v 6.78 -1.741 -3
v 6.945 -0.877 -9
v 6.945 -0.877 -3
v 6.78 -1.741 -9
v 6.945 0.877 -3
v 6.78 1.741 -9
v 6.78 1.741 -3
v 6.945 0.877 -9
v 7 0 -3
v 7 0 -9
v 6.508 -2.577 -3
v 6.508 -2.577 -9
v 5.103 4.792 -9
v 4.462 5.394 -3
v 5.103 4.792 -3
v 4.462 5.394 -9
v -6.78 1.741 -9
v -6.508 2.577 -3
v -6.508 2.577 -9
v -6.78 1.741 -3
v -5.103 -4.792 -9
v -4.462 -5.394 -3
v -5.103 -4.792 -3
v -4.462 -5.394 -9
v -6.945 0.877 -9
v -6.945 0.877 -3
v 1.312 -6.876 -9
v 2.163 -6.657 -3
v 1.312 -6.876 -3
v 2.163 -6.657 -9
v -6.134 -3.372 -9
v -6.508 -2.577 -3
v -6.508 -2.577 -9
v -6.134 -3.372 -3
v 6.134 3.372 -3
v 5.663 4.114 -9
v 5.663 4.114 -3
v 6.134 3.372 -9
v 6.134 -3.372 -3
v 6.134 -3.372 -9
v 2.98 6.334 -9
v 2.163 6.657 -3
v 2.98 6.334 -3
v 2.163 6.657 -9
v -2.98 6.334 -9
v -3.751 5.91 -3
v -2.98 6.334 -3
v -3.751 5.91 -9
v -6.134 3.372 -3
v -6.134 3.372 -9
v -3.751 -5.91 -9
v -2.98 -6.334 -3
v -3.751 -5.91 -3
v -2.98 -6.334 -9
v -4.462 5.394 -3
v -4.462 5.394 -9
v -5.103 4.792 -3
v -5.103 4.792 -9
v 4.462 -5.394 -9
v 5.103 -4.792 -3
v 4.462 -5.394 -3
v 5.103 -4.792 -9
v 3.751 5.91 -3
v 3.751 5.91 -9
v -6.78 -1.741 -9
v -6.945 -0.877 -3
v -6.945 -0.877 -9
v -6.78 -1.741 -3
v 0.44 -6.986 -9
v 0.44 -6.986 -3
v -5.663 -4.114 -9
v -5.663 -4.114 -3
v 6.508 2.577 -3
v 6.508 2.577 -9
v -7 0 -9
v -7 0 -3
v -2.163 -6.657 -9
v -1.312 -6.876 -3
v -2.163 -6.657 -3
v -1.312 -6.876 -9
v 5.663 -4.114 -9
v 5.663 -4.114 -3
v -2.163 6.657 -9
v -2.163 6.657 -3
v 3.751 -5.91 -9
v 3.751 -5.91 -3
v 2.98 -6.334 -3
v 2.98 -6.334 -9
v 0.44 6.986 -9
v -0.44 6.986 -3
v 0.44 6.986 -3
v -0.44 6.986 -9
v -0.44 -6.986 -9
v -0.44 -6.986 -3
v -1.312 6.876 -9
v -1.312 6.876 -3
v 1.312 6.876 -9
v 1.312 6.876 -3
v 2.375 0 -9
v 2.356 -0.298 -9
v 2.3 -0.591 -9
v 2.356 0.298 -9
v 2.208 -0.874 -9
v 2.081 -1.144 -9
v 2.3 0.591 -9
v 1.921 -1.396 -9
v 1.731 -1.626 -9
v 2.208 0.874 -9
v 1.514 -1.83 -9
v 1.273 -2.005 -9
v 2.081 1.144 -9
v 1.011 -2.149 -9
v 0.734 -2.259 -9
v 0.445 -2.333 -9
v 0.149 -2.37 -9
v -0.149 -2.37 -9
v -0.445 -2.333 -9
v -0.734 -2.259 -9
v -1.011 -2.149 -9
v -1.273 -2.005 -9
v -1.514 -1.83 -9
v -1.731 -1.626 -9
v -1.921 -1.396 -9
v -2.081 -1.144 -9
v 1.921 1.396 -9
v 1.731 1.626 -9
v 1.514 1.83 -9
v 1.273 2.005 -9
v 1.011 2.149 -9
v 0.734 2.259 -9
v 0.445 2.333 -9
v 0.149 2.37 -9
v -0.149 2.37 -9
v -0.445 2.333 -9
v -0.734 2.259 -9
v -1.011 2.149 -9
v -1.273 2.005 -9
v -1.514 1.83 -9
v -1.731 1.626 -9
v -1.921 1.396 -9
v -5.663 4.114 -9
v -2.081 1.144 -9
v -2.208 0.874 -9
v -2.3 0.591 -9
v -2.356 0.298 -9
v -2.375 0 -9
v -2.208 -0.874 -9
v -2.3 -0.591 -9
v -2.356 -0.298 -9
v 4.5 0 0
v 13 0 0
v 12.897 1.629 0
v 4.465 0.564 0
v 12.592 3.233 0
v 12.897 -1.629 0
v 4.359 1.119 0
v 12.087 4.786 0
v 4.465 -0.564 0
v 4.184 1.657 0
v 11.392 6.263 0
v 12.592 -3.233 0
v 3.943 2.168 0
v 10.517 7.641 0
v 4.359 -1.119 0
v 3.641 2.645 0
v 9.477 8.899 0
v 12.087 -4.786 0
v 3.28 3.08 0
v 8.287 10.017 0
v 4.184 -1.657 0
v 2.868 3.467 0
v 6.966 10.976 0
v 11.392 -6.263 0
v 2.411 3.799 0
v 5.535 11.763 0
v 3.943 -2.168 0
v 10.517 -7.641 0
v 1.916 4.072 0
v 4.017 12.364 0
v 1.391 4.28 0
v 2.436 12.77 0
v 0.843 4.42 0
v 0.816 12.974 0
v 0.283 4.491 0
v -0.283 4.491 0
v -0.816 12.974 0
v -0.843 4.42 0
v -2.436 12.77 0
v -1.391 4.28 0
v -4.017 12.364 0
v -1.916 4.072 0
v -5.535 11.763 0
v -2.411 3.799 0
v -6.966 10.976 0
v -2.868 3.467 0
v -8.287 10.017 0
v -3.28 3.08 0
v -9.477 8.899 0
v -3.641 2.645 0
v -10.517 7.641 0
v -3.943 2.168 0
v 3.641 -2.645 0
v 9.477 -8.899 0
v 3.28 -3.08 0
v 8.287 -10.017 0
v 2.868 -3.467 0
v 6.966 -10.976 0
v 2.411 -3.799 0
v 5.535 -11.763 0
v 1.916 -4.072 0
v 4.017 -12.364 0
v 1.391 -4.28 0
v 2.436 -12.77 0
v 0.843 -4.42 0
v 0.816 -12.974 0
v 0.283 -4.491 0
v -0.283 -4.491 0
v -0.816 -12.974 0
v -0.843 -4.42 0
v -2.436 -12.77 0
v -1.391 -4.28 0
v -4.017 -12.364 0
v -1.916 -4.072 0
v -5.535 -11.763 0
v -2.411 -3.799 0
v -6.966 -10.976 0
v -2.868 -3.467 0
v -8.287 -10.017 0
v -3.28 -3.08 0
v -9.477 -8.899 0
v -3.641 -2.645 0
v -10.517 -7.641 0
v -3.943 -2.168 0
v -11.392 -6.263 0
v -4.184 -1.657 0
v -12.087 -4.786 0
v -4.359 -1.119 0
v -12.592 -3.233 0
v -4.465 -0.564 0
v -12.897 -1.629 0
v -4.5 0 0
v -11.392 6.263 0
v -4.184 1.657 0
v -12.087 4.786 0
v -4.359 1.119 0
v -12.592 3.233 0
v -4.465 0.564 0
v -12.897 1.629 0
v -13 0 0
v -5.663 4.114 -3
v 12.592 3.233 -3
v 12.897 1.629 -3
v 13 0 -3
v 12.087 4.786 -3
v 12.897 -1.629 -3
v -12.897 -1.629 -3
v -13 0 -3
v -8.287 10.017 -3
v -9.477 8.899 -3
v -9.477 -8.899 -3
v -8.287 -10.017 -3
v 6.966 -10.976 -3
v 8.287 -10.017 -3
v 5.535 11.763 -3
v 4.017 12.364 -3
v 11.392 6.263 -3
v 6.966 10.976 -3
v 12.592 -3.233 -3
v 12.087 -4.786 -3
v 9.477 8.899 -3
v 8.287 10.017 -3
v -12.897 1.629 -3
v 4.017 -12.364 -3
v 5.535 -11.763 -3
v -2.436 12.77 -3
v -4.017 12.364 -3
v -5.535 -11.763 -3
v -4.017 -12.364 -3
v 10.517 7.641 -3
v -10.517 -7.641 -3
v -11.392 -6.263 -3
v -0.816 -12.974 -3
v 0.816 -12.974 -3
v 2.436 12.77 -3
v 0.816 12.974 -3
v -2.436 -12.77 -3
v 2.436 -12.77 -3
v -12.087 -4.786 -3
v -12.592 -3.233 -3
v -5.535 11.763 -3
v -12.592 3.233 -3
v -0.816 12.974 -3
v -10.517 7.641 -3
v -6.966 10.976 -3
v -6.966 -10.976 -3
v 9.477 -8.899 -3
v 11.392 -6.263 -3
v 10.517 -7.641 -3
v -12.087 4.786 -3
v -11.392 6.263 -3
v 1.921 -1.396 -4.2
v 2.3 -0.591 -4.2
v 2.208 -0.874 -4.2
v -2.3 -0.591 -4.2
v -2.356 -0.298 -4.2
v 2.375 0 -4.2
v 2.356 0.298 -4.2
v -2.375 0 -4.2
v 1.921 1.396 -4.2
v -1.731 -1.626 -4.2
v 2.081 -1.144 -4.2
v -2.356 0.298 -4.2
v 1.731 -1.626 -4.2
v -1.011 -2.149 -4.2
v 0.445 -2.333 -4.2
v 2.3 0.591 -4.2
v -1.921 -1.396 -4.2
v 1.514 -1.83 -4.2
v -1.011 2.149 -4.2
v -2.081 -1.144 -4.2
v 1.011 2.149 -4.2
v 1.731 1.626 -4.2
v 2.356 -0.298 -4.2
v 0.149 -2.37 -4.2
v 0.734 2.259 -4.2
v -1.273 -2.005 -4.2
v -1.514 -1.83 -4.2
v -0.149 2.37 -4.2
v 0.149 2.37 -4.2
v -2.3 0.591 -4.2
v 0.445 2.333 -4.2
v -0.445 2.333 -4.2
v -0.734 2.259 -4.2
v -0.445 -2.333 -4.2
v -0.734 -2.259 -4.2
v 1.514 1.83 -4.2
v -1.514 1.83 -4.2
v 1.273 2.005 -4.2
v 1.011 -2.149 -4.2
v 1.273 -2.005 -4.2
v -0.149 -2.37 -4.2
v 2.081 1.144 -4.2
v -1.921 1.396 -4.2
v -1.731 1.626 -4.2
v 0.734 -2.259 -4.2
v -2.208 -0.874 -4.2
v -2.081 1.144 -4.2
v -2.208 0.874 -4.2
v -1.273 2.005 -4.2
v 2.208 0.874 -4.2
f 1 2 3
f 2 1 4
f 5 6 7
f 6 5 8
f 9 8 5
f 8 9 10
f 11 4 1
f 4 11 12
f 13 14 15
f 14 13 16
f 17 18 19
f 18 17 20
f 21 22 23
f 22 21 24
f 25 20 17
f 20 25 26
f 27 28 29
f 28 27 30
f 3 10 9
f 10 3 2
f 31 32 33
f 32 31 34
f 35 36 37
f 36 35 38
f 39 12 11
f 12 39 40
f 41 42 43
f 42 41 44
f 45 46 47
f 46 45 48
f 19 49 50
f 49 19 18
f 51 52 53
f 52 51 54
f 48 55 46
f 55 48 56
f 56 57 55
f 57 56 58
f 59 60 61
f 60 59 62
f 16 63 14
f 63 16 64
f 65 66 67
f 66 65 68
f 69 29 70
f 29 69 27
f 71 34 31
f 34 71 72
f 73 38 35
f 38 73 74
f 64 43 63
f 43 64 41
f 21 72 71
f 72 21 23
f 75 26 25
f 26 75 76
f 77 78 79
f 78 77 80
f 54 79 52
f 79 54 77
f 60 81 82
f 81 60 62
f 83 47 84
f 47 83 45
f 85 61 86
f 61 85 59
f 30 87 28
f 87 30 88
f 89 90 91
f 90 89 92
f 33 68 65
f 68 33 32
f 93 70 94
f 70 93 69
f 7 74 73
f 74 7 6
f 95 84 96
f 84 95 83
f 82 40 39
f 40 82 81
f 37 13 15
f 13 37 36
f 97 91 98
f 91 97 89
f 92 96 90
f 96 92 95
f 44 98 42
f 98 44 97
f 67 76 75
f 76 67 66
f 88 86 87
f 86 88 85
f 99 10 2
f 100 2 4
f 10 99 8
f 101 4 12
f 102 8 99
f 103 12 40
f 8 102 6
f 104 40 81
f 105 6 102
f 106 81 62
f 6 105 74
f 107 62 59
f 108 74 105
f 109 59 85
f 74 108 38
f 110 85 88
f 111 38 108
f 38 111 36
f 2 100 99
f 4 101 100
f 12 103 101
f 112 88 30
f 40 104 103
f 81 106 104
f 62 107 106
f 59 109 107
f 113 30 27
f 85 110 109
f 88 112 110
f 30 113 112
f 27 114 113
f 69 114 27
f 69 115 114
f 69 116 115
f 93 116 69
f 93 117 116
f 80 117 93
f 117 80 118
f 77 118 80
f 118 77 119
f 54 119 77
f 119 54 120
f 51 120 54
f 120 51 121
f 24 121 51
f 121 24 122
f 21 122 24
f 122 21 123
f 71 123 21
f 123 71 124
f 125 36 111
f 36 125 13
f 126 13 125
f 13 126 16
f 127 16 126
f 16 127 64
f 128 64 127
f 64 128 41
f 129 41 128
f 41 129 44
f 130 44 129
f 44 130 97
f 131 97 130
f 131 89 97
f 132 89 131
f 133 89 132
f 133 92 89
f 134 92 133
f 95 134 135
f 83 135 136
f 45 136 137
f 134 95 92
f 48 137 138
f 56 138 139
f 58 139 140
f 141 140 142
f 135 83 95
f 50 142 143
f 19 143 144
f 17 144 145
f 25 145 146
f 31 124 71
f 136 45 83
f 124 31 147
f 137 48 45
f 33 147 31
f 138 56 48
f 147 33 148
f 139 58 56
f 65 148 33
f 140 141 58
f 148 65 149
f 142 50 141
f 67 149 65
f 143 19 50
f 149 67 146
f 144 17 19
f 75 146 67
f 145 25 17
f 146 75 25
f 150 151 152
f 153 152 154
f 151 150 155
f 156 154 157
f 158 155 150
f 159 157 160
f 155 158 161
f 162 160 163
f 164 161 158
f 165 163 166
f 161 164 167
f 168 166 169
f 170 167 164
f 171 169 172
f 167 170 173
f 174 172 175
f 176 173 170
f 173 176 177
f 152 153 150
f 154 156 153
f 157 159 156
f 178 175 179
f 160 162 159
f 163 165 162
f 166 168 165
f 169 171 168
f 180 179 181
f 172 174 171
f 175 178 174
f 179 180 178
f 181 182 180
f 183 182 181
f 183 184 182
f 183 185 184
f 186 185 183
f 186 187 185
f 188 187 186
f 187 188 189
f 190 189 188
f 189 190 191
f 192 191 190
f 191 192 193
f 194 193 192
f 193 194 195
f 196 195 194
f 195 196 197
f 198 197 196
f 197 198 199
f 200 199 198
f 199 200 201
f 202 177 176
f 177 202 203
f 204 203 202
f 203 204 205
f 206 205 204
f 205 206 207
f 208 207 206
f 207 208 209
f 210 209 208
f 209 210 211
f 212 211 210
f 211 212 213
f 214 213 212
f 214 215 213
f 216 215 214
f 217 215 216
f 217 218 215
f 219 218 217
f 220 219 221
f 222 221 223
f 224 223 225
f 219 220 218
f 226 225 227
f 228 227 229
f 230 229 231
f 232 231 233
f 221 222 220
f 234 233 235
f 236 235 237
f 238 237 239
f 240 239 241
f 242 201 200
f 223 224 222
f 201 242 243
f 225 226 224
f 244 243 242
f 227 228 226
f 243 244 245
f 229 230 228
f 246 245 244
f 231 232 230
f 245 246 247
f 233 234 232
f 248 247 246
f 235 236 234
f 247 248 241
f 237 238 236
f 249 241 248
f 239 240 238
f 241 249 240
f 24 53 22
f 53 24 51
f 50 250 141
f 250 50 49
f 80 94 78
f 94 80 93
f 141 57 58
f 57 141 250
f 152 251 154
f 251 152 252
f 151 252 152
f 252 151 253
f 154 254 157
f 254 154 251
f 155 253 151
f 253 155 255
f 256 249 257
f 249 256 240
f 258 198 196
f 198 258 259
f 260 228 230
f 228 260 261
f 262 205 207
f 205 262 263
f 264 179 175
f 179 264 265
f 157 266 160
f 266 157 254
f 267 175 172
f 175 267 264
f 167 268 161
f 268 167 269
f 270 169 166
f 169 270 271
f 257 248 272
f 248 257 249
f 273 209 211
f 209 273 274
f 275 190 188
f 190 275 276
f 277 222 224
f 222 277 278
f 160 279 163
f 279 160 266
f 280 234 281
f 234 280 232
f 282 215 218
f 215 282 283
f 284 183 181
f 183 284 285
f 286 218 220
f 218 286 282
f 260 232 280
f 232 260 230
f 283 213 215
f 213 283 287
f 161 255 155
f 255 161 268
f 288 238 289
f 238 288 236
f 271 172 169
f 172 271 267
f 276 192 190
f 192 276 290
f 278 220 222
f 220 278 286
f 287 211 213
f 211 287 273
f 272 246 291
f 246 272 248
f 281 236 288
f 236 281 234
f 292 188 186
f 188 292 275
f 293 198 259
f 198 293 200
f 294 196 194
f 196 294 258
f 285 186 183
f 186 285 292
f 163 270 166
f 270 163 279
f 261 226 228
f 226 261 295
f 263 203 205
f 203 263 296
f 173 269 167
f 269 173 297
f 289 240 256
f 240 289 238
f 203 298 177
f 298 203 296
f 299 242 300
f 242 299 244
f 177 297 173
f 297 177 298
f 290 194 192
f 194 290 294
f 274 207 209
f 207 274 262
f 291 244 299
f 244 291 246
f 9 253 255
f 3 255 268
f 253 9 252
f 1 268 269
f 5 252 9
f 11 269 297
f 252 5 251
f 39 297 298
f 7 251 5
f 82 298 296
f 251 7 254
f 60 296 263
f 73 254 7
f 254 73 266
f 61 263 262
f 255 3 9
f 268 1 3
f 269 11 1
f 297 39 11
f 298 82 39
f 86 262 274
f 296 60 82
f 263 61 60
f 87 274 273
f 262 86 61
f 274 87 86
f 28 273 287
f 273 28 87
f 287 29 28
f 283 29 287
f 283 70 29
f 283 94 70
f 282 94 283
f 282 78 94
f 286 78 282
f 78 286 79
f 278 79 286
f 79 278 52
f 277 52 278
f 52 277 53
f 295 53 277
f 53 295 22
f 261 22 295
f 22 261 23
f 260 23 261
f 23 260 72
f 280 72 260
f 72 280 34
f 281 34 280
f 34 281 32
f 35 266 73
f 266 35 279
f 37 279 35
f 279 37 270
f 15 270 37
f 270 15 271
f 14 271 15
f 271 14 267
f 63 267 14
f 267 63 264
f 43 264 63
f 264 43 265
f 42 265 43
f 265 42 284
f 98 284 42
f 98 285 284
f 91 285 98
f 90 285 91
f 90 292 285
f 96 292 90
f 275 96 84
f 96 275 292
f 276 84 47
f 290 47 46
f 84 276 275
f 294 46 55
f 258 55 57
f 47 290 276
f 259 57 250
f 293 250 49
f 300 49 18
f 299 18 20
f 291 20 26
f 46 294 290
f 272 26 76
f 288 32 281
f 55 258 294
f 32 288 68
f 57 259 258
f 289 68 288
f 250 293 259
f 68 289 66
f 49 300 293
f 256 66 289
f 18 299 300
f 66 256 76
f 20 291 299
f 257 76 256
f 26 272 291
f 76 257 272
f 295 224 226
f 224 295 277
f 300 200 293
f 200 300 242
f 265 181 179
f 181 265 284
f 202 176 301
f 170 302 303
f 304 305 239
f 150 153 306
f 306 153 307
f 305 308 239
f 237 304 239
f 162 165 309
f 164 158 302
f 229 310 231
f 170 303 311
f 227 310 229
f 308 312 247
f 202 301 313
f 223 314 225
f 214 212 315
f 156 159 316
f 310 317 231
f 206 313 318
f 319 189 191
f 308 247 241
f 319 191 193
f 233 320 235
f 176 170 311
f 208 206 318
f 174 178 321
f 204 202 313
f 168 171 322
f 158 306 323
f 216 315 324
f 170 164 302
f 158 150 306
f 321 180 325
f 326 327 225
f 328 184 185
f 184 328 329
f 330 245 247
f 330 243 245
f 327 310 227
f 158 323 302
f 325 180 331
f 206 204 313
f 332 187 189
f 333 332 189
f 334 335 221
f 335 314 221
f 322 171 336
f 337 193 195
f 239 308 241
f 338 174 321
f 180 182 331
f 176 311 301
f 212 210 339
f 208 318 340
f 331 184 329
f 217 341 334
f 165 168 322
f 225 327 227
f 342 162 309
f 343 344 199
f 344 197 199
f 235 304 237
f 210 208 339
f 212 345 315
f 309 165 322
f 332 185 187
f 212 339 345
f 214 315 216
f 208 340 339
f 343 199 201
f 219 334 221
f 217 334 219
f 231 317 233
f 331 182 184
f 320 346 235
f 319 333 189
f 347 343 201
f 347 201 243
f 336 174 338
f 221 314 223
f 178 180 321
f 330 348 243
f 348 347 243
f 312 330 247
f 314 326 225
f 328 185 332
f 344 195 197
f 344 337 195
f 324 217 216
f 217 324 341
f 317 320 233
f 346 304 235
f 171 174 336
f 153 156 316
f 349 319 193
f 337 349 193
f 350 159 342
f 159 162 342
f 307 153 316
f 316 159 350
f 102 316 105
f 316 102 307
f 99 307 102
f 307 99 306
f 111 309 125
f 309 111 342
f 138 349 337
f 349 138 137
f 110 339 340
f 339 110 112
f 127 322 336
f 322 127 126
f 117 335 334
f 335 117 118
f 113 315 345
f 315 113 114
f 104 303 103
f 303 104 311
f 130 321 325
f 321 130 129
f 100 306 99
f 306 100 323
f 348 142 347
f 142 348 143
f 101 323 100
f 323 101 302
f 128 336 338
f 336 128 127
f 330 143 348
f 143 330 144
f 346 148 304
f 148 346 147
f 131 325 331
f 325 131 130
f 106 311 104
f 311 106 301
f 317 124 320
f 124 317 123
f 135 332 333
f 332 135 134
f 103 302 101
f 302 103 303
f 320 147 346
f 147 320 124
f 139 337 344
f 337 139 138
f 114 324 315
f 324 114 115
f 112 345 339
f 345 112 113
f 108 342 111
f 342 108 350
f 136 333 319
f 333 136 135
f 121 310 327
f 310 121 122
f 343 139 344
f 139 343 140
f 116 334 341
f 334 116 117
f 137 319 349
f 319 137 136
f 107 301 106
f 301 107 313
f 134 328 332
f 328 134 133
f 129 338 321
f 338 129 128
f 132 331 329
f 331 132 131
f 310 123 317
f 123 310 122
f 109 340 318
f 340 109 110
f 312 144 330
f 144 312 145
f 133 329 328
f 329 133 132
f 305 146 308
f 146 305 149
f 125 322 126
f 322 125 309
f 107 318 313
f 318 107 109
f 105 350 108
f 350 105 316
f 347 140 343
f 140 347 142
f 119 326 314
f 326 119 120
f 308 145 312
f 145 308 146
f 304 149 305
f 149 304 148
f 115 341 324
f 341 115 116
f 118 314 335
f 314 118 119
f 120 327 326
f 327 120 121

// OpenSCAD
$fn = 50;


difference() {
	union() {
		translate(v = [0, 0, -9.0000000000]) {
			cylinder(h = 9, r = 7.0000000000);
		}
		translate(v = [0, 0, -3.0000000000]) {
			cylinder(h = 3, r = 13.0000000000);
		}
	}
	union() {
		translate(v = [0, 0, 0]) {
			rotate(a = [0, 0, 0]) {
				difference() {
					union() {
						#translate(v = [0, 0, -9.0000000000]) {
							cylinder(h = 9, r = 2.2500000000);
						}
						#translate(v = [0, 0, -4.2000000000]) {
							cylinder(h = 4.2000000000, r = 7.0000000000, r1 = 2.3750000000, r2 = 4.5000000000);
						}
						#translate(v = [0, 0, -9.0000000000]) {
							cylinder(h = 9, r = 2.3750000000);
						}
						#translate(v = [0, 0, -9.0000000000]) {
							cylinder(h = 9, r = 2.2500000000);
						}
					}
					union();
				}
			}
		}
	}
}
